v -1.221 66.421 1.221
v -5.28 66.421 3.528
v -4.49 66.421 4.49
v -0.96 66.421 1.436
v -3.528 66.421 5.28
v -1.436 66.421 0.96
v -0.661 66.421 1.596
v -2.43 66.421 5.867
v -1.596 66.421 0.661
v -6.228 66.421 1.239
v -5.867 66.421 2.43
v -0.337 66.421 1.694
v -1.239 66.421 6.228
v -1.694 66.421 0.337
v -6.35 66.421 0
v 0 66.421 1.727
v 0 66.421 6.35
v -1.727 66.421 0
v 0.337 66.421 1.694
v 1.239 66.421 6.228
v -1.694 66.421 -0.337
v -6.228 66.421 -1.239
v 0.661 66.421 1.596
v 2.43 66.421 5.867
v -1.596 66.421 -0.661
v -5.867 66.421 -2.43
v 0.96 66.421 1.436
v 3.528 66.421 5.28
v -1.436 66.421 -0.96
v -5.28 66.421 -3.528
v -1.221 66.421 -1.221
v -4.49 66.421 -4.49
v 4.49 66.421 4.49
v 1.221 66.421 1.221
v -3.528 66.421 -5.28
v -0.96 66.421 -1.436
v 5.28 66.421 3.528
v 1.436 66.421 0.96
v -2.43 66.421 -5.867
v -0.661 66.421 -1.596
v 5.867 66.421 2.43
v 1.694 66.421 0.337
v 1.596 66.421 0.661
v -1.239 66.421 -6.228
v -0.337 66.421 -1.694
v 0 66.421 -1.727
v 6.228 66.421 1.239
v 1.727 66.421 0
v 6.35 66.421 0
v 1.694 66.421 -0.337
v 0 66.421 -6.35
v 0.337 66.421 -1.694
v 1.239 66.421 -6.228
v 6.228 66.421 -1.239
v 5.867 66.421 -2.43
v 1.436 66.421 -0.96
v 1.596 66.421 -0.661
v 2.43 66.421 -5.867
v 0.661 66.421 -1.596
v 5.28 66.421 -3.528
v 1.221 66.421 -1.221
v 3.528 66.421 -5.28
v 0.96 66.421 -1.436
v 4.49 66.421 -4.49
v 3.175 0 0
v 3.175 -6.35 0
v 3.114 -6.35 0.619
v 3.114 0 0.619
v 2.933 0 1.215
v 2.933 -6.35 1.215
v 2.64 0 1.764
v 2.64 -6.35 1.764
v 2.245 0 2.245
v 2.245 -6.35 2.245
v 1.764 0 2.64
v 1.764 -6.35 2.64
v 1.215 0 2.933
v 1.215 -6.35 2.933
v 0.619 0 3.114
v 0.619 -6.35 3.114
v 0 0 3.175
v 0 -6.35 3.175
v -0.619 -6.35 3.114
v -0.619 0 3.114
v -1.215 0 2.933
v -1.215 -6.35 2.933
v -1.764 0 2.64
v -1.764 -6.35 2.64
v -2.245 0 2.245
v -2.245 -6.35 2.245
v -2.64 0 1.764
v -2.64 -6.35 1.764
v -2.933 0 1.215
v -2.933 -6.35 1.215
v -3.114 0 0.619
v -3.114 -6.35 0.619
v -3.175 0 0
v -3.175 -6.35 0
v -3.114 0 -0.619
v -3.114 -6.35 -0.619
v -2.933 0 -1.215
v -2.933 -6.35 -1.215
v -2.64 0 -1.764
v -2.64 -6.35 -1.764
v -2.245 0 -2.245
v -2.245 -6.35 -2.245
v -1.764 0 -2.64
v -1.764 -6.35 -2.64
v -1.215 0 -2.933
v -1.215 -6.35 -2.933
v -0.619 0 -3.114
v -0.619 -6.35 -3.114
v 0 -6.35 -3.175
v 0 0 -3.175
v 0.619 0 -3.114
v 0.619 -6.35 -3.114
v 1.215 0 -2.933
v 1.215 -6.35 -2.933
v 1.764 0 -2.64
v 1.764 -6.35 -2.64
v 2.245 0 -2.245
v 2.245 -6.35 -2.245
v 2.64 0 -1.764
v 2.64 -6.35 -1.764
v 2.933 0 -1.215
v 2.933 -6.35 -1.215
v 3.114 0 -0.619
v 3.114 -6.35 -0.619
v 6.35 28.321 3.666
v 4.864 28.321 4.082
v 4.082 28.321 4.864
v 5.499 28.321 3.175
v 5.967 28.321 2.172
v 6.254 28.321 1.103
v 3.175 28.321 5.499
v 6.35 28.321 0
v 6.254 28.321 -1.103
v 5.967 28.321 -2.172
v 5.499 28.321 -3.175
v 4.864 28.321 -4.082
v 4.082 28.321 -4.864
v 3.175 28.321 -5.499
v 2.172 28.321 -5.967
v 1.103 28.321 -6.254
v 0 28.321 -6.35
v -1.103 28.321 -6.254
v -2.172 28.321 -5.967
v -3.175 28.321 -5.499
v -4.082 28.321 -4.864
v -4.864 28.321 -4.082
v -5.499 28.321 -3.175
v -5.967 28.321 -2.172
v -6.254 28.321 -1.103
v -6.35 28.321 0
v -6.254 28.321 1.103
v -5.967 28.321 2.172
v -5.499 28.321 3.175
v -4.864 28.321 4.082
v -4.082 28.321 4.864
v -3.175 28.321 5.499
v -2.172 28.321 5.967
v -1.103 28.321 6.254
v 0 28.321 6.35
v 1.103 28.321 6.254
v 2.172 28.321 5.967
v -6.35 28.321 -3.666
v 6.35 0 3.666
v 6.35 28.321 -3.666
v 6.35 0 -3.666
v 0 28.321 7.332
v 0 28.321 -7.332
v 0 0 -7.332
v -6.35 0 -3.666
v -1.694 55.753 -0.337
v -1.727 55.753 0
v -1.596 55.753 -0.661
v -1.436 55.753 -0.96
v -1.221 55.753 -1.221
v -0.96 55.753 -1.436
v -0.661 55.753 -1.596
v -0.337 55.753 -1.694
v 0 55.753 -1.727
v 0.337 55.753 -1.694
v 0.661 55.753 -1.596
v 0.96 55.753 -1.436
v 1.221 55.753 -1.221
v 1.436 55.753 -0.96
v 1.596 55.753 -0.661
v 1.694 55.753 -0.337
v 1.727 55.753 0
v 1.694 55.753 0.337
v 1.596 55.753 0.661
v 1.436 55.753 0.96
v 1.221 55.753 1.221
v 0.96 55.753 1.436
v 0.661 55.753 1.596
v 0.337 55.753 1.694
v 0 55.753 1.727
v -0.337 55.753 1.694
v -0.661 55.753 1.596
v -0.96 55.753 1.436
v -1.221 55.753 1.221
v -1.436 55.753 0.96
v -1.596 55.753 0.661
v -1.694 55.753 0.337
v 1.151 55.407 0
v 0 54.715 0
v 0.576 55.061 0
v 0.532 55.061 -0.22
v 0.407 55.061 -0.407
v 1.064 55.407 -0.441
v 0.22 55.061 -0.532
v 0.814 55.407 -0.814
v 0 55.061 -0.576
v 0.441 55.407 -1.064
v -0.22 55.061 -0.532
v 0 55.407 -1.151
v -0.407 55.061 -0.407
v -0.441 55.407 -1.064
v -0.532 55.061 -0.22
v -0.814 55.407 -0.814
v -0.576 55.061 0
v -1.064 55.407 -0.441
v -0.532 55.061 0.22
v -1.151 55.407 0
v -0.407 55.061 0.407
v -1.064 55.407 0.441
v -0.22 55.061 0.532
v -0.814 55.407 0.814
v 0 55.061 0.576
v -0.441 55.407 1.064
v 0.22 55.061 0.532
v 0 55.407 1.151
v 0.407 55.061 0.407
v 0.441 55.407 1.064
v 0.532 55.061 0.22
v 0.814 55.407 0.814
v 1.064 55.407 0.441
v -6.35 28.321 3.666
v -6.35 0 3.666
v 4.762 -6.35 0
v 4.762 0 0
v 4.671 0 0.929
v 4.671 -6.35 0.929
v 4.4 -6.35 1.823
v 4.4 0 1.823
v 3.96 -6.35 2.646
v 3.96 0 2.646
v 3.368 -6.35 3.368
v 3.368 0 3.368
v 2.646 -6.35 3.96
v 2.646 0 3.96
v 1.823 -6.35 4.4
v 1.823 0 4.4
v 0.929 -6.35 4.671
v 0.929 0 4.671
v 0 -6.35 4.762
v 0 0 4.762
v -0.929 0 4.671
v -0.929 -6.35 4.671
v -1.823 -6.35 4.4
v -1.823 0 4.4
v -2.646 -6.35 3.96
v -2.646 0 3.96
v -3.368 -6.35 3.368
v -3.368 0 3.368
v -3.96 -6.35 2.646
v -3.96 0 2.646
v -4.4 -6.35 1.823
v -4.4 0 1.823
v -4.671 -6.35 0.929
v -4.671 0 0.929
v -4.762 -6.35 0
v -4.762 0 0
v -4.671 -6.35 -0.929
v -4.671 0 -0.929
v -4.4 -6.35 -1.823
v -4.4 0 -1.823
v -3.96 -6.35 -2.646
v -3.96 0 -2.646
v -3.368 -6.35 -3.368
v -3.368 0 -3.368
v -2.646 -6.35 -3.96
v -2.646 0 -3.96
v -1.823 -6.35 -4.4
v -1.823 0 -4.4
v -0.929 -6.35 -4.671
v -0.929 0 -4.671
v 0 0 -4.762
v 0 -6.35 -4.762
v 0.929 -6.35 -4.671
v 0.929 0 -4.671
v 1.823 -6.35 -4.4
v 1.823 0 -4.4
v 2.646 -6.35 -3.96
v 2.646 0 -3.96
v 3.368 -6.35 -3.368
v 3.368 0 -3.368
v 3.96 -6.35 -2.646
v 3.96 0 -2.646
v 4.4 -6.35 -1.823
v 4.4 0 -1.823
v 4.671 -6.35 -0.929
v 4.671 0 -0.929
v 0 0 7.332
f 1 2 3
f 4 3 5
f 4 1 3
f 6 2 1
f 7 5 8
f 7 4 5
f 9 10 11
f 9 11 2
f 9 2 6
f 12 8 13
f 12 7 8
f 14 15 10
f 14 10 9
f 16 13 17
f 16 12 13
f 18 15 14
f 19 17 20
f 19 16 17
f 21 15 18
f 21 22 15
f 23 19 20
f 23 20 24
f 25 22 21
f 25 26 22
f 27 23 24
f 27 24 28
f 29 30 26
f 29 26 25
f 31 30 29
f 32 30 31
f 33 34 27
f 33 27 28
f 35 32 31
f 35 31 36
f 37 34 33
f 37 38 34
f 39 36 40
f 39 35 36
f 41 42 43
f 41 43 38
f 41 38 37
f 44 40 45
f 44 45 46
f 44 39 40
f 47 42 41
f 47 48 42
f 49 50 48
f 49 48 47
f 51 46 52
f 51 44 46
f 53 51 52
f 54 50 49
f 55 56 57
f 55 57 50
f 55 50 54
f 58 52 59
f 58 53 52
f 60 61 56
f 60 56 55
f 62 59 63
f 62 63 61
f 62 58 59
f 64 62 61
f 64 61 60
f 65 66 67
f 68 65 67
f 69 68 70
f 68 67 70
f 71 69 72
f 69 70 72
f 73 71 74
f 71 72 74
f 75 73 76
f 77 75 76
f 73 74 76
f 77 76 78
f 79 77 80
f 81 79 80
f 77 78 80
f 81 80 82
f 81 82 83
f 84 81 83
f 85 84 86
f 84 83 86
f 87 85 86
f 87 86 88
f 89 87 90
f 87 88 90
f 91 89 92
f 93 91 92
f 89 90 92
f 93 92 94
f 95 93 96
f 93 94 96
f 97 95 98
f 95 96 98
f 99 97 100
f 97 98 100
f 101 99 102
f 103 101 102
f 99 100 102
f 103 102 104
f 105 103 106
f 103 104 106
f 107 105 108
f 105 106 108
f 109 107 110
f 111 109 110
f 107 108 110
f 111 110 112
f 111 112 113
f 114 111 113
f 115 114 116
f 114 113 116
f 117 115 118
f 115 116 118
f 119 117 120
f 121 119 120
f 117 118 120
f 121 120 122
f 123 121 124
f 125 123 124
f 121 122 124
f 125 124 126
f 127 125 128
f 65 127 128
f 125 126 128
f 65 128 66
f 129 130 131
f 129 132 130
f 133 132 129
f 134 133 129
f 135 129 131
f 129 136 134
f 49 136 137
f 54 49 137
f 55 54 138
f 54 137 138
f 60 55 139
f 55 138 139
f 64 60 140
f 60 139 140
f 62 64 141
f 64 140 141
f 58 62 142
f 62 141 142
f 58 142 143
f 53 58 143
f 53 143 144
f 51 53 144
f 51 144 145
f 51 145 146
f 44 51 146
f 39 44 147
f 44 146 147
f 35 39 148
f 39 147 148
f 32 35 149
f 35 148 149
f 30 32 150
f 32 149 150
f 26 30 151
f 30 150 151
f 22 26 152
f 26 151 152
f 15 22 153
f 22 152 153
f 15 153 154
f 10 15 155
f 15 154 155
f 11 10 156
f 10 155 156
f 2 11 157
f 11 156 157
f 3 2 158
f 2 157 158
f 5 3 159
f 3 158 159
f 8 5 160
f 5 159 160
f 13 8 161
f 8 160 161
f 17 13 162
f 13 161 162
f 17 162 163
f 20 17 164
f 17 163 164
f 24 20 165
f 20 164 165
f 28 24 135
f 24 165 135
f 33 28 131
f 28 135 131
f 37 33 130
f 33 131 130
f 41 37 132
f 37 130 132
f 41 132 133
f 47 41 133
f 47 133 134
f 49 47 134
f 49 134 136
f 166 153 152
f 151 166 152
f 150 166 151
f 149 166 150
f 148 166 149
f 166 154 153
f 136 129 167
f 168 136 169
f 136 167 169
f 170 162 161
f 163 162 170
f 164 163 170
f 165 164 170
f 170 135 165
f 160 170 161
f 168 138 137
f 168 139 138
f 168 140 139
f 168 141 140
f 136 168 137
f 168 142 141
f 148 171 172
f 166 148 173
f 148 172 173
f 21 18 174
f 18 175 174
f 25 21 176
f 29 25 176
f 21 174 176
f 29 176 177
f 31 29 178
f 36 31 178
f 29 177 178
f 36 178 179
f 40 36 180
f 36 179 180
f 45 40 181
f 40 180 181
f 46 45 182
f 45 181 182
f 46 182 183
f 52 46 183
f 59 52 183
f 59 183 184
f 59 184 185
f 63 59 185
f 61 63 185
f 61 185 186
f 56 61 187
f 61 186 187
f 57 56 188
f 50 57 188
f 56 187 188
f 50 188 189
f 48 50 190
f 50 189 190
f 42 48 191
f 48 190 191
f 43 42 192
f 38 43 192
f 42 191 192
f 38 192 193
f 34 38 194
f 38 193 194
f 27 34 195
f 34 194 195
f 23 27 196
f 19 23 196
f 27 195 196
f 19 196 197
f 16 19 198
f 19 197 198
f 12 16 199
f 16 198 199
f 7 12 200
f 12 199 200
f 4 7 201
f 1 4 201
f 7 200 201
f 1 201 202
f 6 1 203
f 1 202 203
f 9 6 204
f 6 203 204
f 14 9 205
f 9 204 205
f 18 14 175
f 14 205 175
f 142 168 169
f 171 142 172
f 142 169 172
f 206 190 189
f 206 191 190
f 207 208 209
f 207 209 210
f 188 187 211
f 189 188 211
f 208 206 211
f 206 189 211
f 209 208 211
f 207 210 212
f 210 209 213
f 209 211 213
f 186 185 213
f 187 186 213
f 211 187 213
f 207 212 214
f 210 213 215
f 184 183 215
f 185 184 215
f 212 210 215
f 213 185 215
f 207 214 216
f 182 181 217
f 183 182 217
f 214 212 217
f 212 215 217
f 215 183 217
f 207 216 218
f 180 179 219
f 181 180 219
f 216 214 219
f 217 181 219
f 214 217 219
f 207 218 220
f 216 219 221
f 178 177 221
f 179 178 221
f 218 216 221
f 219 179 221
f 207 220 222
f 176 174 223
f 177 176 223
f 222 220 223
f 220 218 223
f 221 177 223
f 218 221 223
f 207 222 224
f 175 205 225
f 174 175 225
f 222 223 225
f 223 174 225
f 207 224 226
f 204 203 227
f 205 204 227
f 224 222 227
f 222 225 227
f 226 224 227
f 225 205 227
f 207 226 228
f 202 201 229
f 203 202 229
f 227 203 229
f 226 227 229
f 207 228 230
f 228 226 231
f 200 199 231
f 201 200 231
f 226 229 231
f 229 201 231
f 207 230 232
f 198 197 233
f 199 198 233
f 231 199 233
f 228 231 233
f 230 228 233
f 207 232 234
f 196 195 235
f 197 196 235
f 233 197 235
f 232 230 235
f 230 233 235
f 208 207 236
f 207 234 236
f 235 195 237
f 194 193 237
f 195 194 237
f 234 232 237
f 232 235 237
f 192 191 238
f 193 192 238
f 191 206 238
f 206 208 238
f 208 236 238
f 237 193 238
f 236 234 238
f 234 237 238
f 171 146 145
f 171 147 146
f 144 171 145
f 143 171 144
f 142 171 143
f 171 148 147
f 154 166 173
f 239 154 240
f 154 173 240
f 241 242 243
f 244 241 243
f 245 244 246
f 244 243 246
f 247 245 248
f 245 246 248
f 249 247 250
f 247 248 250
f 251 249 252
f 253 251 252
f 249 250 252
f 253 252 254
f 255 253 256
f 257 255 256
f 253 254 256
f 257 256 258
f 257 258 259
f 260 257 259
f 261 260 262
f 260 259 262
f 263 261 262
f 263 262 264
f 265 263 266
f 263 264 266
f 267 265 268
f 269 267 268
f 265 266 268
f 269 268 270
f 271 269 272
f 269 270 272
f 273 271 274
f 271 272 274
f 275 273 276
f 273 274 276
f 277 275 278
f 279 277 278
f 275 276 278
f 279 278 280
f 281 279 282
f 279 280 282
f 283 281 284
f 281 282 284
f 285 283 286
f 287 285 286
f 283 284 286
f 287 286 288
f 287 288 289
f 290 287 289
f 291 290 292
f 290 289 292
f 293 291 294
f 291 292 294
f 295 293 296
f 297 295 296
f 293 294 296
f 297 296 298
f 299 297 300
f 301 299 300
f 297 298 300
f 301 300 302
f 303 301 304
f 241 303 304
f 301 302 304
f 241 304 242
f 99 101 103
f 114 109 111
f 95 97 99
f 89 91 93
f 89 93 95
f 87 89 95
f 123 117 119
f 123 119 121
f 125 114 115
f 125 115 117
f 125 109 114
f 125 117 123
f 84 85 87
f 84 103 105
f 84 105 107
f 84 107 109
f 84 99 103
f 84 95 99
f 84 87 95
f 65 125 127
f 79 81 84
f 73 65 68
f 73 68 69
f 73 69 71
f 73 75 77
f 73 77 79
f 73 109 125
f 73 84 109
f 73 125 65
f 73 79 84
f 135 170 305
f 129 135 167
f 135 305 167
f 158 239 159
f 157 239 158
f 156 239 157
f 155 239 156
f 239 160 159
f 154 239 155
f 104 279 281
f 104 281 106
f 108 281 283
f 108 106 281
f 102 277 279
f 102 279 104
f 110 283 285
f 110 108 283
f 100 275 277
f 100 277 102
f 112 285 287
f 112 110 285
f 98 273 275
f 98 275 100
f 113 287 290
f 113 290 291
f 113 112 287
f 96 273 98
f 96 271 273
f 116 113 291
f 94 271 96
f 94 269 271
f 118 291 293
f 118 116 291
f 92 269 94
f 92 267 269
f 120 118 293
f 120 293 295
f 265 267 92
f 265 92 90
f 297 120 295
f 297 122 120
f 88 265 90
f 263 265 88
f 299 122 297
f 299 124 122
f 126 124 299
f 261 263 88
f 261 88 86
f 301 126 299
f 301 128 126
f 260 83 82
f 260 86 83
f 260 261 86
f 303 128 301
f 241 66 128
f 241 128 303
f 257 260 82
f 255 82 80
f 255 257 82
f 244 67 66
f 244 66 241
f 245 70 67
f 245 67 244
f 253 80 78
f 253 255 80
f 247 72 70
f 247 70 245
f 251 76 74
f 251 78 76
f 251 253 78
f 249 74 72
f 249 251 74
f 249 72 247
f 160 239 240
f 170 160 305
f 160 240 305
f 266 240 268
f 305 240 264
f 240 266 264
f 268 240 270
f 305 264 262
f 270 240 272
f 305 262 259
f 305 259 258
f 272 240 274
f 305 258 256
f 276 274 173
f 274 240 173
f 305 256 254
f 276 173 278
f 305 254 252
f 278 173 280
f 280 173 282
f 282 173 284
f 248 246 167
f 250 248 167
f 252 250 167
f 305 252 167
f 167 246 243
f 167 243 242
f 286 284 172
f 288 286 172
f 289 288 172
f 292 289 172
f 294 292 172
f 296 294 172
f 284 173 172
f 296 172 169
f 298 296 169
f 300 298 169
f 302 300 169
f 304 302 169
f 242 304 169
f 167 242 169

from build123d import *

# Parameters (mm, degrees)
BOSS_EXTRUDE1_DEPTH       = 28.321
SKETCH2_R                 = 4.7625
BOSS_EXTRUDE2_DEPTH       = 6.35
SKETCH3_R                 = 6.35
BOSS_EXTRUDE3_DEPTH       = 38.1
F_8_32_TAPPED_HOLE1_D     = 3.4544
F_8_32_TAPPED_HOLE1_DEPTH = 10.668
F_8_32_TAPPED_HOLE1_TIP   = 1.037806461
SKETCH7_R                 = 3.175
CUT_EXTRUDE2_DEPTH        = 6.35


with BuildPart() as part:
    # Sketch1 → Boss-Extrude1 (new body)
    with BuildSketch(Plane(origin=(0, 0, 0), x_dir=(1, 0, 0), z_dir=(0, 1, 0))):
        Polygon((6.35, -3.666174209), (6.35, 3.666174209), (0, 7.332348419), (-6.35, 3.666174209), (-6.35, -3.666174209), (0, -7.332348419), align=None)
    extrude(amount=BOSS_EXTRUDE1_DEPTH)

    # Sketch2 → Boss-Extrude2 (add)
    with BuildSketch(Plane.XZ):
        Circle(SKETCH2_R)
    extrude(amount=BOSS_EXTRUDE2_DEPTH)

    # Sketch3 → Boss-Extrude3 (add)
    with BuildSketch(Plane(origin=(0, 28.321, 0), x_dir=(1, 0, 0), z_dir=(0, 1, 0))):
        Circle(SKETCH3_R)
    extrude(amount=BOSS_EXTRUDE3_DEPTH)

    # #8-32 Tapped Hole1
    with Locations(Plane(origin=(0, 66.421, 0), x_dir=(1, 0, 0), z_dir=(0, 1, 0))):
        with Locations((0, 0)):
            Hole(F_8_32_TAPPED_HOLE1_D / 2, depth=F_8_32_TAPPED_HOLE1_DEPTH)
            with Locations((0, 0, -(F_8_32_TAPPED_HOLE1_DEPTH + F_8_32_TAPPED_HOLE1_TIP / 2))):  # 118° drill point
                Cone(0, F_8_32_TAPPED_HOLE1_D / 2, F_8_32_TAPPED_HOLE1_TIP, mode=Mode.SUBTRACT)

    # Sketch7 → Cut-Extrude2 (cut)
    with BuildSketch(Plane.XZ.offset(6.35)):
        Circle(SKETCH7_R)
    extrude(amount=-CUT_EXTRUDE2_DEPTH, mode=Mode.SUBTRACT)


solid = part.part
